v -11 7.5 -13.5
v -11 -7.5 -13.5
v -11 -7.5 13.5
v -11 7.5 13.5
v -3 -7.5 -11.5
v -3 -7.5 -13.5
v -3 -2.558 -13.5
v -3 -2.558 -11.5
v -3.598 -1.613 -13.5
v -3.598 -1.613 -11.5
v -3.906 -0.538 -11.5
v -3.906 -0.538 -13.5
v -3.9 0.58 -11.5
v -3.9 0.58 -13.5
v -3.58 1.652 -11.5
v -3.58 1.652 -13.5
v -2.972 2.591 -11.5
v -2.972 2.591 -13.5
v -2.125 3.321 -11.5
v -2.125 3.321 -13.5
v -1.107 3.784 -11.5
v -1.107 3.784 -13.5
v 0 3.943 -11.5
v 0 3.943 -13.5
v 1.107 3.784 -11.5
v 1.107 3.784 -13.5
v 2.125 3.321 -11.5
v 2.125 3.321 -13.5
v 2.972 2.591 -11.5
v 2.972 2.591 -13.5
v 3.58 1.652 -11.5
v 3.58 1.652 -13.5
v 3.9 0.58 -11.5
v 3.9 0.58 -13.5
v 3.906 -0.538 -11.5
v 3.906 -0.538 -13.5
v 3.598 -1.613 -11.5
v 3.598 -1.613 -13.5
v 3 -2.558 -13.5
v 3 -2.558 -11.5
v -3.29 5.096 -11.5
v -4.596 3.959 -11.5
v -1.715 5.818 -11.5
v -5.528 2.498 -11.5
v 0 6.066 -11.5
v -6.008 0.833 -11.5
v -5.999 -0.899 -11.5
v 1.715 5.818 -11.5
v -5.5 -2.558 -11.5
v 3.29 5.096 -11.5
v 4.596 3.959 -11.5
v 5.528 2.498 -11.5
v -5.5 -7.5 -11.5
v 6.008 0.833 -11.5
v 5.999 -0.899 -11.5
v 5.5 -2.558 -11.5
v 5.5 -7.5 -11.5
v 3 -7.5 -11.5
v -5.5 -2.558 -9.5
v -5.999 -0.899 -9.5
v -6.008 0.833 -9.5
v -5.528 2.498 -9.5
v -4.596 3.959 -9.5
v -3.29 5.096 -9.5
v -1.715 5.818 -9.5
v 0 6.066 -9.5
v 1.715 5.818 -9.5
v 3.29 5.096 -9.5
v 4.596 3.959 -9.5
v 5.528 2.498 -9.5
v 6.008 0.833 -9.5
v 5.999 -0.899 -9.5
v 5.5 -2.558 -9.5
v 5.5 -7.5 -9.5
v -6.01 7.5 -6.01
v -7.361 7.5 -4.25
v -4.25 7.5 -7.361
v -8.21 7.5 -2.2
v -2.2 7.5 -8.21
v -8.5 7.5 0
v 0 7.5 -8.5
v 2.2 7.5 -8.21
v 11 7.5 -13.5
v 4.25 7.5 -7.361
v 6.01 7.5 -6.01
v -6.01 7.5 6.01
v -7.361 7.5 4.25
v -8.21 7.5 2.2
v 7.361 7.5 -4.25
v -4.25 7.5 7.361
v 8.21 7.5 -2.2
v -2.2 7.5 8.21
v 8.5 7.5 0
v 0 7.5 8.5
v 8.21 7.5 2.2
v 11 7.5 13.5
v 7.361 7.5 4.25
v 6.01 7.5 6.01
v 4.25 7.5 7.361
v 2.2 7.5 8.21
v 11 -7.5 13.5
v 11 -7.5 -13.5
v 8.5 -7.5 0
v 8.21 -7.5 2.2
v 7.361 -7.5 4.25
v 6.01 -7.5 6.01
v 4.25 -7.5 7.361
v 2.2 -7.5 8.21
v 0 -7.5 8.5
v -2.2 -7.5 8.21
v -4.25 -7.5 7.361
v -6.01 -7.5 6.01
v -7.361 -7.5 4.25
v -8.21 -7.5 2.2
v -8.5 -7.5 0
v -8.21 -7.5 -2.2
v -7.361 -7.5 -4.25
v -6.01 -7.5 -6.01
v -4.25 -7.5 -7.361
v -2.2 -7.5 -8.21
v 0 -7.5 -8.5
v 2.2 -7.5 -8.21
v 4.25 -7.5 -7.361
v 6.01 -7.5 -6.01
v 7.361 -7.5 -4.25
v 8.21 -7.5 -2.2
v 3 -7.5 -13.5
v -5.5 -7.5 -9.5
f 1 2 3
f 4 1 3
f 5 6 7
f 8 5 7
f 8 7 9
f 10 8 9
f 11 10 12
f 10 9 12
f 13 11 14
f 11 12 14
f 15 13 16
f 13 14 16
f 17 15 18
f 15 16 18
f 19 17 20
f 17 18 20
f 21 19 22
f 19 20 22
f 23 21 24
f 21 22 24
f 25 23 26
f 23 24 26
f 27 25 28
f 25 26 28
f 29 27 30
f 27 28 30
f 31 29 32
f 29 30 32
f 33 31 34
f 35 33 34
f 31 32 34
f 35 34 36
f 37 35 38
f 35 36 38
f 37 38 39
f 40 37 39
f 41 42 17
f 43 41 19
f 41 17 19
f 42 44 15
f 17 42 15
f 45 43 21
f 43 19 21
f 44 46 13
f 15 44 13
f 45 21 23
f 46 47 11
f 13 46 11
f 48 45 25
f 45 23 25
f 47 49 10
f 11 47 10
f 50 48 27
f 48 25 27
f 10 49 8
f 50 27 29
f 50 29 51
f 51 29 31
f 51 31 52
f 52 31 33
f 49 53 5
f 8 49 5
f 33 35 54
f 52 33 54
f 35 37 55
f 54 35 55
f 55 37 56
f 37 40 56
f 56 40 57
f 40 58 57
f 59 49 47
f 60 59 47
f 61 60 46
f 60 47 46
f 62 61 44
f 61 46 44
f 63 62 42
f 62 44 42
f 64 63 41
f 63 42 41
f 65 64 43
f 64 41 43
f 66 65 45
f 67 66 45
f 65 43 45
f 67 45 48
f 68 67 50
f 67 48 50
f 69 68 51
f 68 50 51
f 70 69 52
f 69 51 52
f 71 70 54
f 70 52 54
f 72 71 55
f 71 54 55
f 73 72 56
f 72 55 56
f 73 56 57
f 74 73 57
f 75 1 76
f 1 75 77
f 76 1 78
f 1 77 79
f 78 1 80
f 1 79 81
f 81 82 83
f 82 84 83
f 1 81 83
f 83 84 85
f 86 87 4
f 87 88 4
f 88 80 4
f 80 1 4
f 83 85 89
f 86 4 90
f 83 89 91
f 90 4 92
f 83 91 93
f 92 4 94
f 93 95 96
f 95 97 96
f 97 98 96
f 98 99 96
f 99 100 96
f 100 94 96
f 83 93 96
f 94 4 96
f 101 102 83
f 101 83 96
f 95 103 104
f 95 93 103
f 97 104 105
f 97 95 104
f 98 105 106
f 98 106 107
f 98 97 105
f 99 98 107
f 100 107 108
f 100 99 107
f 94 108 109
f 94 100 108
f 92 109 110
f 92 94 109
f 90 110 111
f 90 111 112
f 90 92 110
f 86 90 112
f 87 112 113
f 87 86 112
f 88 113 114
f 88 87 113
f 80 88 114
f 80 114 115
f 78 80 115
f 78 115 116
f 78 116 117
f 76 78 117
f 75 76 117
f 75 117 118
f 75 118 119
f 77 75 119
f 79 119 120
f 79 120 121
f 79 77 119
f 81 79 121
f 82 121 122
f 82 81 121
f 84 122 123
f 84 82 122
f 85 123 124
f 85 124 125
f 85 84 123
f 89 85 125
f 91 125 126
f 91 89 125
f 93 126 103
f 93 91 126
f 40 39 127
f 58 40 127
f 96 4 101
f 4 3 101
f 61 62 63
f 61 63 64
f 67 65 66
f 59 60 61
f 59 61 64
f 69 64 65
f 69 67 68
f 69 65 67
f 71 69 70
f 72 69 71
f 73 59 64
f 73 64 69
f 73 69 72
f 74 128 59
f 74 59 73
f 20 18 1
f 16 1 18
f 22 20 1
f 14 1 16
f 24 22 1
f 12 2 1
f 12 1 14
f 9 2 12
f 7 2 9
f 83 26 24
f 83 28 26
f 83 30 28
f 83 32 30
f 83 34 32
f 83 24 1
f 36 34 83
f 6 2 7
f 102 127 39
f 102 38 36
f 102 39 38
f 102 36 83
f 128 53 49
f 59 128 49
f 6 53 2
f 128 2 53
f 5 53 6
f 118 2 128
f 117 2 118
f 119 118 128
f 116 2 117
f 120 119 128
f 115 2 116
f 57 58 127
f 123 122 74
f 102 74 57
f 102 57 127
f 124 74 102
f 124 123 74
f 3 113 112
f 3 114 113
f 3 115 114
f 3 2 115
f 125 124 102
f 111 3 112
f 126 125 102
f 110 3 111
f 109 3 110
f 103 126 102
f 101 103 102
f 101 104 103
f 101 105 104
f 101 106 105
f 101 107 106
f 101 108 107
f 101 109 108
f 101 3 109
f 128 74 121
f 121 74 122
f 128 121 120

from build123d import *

# Parameters (mm, degrees)
F0_W     = 22
F0_H     = 27
F0_R     = 8.5
F1_DEPTH = 7.5
F3_DEPTH = 2
F6_DEPTH = 2


with BuildPart() as f1:
    # F0 (on Front) → F1 (new body, symmetric)
    with BuildSketch(Plane.XZ):
        Rectangle(F0_W, F0_H)
        Circle(F0_R, mode=Mode.SUBTRACT)
    extrude(amount=F1_DEPTH, both=True)

    # F2 (on face) → F3 (cut)
    with BuildSketch(Plane(origin=(0, 0, -13.5), x_dir=(1, 0, 0), z_dir=(0, 0, -1))):
        with BuildLine():
            Line((3, 7.5), (-3, 7.5))
            Line((-3, 7.5), (-3, 2.5583377574))
            ThreePointArc((-3, 2.5583377574), (0, -3.9427264781), (3, 2.5583377574))
            Line((3, 2.5583377574), (3, 7.5))
        make_face()
    extrude(amount=-F3_DEPTH, mode=Mode.SUBTRACT)

    # F5 (on offset) → F6 (cut)
    with BuildSketch(Plane(origin=(0, 0, -11.5), x_dir=(1, 0, 0), z_dir=(0, 0, -1))):
        with BuildLine():
            Line((5.5, 7.5), (-5.5, 7.5))
            Line((-5.5, 7.5), (-5.5, 2.5583377574))
            ThreePointArc((-5.5, 2.5583377574), (0, -6.0658958185), (5.5, 2.5583377574))
            Line((5.5, 2.5583377574), (5.5, 7.5))
        make_face()
    extrude(amount=-F6_DEPTH, mode=Mode.SUBTRACT)


solid = f1.part
